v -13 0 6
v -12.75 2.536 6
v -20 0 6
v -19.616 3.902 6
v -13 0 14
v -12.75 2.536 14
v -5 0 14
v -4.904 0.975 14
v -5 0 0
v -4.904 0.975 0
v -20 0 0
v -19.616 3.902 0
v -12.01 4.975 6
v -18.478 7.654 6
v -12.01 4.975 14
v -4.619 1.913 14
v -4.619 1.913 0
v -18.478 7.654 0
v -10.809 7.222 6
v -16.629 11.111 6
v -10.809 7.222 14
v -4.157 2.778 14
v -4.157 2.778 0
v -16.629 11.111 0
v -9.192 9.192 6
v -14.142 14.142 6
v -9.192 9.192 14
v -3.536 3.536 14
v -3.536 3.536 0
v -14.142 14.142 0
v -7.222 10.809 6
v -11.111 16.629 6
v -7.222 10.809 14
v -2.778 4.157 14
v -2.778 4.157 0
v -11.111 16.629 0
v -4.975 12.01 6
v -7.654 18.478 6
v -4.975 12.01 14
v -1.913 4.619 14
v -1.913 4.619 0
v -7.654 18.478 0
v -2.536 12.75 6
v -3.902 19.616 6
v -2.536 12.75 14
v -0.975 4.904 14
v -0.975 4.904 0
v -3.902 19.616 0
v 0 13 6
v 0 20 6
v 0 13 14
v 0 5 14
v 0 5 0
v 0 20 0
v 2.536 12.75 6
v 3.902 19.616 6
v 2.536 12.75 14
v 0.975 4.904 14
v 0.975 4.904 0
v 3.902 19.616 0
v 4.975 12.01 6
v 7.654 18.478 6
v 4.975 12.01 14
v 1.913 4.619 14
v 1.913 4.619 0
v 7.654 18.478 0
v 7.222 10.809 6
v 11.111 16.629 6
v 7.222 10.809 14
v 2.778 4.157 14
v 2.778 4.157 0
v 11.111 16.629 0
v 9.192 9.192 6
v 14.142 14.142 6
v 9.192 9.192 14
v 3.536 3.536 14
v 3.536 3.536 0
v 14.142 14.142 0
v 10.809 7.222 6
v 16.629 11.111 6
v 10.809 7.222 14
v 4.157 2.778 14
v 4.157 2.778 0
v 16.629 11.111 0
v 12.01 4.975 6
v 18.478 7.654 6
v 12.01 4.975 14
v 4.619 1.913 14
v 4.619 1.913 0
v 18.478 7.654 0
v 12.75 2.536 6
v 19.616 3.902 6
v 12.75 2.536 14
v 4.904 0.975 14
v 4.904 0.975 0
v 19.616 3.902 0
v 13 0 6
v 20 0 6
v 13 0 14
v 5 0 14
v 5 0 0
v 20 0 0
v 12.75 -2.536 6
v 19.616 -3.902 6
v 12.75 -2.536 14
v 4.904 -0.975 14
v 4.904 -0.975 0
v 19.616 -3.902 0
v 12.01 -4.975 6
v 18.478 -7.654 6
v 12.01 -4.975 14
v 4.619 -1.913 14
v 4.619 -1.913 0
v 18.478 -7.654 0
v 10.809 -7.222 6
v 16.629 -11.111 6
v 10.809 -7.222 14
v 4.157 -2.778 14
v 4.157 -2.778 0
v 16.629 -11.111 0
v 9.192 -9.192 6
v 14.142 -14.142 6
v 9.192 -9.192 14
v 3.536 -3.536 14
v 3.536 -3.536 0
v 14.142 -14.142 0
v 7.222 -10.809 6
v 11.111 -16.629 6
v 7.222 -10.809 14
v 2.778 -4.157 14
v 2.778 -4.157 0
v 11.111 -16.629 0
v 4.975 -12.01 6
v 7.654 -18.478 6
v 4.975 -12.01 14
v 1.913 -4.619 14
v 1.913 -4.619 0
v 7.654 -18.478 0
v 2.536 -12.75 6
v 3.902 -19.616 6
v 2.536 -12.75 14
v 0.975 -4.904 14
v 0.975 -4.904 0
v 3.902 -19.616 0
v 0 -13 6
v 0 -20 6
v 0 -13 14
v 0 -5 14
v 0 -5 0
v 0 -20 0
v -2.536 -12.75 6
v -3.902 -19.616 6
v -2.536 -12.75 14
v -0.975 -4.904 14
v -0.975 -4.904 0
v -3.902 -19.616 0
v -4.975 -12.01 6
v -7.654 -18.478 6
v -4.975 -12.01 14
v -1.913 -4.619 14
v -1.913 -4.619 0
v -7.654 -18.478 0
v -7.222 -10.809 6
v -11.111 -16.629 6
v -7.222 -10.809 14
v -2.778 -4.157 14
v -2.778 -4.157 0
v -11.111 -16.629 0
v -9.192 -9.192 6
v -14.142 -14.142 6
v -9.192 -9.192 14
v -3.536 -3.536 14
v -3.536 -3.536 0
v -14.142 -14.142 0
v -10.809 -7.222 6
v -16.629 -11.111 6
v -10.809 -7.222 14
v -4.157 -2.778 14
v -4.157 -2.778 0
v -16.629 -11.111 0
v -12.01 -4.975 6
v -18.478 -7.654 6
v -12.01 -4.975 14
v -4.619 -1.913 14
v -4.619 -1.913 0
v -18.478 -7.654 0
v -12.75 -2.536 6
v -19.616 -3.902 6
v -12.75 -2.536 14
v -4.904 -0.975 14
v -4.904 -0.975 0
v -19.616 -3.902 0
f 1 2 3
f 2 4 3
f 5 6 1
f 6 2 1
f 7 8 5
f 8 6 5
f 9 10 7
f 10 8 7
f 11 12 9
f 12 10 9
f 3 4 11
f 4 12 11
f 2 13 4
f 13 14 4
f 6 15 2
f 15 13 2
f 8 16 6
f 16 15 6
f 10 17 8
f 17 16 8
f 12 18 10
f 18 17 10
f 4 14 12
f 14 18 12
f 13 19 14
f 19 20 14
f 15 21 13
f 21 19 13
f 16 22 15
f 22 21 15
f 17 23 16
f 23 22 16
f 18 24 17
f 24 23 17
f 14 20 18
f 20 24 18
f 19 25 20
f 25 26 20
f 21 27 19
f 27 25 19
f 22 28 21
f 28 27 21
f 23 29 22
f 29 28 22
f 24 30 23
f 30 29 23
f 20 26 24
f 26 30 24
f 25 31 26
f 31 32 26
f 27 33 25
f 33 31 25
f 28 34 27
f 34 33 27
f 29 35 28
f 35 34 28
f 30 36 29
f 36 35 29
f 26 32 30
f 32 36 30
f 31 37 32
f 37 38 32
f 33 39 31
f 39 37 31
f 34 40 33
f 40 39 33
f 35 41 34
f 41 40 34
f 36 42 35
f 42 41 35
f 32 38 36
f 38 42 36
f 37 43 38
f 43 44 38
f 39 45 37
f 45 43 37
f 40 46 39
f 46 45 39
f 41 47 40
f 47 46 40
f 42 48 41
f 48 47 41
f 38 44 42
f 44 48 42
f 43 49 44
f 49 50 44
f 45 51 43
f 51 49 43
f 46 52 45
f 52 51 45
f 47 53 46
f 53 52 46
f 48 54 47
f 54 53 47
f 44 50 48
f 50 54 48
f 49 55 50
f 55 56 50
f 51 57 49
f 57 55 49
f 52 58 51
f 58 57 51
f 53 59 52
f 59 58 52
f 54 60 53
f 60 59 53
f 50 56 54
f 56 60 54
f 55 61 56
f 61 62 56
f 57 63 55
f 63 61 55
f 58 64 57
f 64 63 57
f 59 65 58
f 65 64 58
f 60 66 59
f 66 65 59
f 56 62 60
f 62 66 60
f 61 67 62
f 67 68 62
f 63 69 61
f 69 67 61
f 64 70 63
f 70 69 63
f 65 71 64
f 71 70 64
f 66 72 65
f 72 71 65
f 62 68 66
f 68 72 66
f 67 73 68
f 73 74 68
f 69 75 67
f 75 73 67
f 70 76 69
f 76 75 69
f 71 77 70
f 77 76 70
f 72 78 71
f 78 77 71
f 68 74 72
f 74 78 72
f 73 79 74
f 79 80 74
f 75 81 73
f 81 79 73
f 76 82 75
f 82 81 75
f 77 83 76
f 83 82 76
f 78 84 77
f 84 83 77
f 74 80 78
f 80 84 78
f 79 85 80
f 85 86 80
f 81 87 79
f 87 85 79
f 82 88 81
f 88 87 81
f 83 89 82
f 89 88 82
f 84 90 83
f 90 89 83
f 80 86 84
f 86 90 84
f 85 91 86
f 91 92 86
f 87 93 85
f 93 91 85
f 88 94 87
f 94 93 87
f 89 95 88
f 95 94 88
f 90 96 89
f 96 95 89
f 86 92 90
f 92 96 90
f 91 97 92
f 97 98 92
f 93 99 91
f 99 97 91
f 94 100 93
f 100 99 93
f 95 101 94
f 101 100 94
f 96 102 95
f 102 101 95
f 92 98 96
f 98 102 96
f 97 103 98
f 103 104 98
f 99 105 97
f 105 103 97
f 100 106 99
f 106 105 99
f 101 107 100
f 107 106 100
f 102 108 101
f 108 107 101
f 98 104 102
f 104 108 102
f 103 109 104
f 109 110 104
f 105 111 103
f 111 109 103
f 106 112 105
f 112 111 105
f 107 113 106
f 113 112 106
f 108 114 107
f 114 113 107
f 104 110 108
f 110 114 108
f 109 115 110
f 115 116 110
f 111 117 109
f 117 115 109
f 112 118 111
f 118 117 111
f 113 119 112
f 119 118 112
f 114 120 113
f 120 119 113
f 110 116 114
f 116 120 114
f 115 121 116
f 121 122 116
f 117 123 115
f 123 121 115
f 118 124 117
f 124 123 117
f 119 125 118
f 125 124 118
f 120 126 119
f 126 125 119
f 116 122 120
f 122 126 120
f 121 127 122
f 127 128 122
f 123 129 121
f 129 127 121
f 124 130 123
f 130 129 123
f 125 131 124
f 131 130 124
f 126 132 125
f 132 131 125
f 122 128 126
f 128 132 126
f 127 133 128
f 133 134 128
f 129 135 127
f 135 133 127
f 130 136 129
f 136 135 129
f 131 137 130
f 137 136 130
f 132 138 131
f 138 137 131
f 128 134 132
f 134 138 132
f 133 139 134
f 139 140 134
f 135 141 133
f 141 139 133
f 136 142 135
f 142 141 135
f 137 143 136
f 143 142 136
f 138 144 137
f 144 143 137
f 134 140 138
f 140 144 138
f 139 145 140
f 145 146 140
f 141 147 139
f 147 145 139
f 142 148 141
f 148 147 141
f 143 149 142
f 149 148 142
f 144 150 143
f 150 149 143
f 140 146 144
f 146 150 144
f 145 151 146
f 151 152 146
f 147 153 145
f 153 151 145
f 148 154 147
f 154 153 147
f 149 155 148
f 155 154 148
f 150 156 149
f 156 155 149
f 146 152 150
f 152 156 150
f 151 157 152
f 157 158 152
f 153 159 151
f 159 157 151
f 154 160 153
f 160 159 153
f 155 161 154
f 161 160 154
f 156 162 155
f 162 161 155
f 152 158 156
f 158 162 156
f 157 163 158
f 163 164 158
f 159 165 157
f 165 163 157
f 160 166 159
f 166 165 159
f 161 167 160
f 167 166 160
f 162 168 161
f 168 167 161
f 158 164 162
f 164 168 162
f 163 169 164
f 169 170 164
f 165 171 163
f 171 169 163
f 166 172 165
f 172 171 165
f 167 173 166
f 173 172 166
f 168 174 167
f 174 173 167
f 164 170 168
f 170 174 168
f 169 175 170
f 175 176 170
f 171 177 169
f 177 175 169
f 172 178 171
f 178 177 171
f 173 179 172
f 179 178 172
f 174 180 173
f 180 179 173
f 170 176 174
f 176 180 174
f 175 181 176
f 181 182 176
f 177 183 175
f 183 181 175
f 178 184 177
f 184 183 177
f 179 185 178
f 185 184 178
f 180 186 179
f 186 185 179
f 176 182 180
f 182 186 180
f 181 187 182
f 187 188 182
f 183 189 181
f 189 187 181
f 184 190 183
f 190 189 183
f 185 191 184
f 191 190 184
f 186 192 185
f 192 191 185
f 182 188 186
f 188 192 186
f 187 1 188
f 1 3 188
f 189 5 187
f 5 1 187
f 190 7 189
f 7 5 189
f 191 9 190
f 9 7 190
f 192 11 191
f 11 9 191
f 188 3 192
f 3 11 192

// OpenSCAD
$fn = 32;

// ----------------------------------------------------------------------
// Arc stop: collar, 14 mm thick
// ----------------------------------------------------------------------

// --- parameters (mm) ---
revolve_angle = 360;      // full turn around the Z axis
profile_points = 6;       // points of the closed outline

profile = [[5, 0], [20, 0], [20, 6], [13, 6], [13, 14], [5, 14]];  // single closed polygon, 6 points, counter clockwise

// --- the one profile operation ---
rotate_extrude(angle = revolve_angle) polygon(points = profile);
